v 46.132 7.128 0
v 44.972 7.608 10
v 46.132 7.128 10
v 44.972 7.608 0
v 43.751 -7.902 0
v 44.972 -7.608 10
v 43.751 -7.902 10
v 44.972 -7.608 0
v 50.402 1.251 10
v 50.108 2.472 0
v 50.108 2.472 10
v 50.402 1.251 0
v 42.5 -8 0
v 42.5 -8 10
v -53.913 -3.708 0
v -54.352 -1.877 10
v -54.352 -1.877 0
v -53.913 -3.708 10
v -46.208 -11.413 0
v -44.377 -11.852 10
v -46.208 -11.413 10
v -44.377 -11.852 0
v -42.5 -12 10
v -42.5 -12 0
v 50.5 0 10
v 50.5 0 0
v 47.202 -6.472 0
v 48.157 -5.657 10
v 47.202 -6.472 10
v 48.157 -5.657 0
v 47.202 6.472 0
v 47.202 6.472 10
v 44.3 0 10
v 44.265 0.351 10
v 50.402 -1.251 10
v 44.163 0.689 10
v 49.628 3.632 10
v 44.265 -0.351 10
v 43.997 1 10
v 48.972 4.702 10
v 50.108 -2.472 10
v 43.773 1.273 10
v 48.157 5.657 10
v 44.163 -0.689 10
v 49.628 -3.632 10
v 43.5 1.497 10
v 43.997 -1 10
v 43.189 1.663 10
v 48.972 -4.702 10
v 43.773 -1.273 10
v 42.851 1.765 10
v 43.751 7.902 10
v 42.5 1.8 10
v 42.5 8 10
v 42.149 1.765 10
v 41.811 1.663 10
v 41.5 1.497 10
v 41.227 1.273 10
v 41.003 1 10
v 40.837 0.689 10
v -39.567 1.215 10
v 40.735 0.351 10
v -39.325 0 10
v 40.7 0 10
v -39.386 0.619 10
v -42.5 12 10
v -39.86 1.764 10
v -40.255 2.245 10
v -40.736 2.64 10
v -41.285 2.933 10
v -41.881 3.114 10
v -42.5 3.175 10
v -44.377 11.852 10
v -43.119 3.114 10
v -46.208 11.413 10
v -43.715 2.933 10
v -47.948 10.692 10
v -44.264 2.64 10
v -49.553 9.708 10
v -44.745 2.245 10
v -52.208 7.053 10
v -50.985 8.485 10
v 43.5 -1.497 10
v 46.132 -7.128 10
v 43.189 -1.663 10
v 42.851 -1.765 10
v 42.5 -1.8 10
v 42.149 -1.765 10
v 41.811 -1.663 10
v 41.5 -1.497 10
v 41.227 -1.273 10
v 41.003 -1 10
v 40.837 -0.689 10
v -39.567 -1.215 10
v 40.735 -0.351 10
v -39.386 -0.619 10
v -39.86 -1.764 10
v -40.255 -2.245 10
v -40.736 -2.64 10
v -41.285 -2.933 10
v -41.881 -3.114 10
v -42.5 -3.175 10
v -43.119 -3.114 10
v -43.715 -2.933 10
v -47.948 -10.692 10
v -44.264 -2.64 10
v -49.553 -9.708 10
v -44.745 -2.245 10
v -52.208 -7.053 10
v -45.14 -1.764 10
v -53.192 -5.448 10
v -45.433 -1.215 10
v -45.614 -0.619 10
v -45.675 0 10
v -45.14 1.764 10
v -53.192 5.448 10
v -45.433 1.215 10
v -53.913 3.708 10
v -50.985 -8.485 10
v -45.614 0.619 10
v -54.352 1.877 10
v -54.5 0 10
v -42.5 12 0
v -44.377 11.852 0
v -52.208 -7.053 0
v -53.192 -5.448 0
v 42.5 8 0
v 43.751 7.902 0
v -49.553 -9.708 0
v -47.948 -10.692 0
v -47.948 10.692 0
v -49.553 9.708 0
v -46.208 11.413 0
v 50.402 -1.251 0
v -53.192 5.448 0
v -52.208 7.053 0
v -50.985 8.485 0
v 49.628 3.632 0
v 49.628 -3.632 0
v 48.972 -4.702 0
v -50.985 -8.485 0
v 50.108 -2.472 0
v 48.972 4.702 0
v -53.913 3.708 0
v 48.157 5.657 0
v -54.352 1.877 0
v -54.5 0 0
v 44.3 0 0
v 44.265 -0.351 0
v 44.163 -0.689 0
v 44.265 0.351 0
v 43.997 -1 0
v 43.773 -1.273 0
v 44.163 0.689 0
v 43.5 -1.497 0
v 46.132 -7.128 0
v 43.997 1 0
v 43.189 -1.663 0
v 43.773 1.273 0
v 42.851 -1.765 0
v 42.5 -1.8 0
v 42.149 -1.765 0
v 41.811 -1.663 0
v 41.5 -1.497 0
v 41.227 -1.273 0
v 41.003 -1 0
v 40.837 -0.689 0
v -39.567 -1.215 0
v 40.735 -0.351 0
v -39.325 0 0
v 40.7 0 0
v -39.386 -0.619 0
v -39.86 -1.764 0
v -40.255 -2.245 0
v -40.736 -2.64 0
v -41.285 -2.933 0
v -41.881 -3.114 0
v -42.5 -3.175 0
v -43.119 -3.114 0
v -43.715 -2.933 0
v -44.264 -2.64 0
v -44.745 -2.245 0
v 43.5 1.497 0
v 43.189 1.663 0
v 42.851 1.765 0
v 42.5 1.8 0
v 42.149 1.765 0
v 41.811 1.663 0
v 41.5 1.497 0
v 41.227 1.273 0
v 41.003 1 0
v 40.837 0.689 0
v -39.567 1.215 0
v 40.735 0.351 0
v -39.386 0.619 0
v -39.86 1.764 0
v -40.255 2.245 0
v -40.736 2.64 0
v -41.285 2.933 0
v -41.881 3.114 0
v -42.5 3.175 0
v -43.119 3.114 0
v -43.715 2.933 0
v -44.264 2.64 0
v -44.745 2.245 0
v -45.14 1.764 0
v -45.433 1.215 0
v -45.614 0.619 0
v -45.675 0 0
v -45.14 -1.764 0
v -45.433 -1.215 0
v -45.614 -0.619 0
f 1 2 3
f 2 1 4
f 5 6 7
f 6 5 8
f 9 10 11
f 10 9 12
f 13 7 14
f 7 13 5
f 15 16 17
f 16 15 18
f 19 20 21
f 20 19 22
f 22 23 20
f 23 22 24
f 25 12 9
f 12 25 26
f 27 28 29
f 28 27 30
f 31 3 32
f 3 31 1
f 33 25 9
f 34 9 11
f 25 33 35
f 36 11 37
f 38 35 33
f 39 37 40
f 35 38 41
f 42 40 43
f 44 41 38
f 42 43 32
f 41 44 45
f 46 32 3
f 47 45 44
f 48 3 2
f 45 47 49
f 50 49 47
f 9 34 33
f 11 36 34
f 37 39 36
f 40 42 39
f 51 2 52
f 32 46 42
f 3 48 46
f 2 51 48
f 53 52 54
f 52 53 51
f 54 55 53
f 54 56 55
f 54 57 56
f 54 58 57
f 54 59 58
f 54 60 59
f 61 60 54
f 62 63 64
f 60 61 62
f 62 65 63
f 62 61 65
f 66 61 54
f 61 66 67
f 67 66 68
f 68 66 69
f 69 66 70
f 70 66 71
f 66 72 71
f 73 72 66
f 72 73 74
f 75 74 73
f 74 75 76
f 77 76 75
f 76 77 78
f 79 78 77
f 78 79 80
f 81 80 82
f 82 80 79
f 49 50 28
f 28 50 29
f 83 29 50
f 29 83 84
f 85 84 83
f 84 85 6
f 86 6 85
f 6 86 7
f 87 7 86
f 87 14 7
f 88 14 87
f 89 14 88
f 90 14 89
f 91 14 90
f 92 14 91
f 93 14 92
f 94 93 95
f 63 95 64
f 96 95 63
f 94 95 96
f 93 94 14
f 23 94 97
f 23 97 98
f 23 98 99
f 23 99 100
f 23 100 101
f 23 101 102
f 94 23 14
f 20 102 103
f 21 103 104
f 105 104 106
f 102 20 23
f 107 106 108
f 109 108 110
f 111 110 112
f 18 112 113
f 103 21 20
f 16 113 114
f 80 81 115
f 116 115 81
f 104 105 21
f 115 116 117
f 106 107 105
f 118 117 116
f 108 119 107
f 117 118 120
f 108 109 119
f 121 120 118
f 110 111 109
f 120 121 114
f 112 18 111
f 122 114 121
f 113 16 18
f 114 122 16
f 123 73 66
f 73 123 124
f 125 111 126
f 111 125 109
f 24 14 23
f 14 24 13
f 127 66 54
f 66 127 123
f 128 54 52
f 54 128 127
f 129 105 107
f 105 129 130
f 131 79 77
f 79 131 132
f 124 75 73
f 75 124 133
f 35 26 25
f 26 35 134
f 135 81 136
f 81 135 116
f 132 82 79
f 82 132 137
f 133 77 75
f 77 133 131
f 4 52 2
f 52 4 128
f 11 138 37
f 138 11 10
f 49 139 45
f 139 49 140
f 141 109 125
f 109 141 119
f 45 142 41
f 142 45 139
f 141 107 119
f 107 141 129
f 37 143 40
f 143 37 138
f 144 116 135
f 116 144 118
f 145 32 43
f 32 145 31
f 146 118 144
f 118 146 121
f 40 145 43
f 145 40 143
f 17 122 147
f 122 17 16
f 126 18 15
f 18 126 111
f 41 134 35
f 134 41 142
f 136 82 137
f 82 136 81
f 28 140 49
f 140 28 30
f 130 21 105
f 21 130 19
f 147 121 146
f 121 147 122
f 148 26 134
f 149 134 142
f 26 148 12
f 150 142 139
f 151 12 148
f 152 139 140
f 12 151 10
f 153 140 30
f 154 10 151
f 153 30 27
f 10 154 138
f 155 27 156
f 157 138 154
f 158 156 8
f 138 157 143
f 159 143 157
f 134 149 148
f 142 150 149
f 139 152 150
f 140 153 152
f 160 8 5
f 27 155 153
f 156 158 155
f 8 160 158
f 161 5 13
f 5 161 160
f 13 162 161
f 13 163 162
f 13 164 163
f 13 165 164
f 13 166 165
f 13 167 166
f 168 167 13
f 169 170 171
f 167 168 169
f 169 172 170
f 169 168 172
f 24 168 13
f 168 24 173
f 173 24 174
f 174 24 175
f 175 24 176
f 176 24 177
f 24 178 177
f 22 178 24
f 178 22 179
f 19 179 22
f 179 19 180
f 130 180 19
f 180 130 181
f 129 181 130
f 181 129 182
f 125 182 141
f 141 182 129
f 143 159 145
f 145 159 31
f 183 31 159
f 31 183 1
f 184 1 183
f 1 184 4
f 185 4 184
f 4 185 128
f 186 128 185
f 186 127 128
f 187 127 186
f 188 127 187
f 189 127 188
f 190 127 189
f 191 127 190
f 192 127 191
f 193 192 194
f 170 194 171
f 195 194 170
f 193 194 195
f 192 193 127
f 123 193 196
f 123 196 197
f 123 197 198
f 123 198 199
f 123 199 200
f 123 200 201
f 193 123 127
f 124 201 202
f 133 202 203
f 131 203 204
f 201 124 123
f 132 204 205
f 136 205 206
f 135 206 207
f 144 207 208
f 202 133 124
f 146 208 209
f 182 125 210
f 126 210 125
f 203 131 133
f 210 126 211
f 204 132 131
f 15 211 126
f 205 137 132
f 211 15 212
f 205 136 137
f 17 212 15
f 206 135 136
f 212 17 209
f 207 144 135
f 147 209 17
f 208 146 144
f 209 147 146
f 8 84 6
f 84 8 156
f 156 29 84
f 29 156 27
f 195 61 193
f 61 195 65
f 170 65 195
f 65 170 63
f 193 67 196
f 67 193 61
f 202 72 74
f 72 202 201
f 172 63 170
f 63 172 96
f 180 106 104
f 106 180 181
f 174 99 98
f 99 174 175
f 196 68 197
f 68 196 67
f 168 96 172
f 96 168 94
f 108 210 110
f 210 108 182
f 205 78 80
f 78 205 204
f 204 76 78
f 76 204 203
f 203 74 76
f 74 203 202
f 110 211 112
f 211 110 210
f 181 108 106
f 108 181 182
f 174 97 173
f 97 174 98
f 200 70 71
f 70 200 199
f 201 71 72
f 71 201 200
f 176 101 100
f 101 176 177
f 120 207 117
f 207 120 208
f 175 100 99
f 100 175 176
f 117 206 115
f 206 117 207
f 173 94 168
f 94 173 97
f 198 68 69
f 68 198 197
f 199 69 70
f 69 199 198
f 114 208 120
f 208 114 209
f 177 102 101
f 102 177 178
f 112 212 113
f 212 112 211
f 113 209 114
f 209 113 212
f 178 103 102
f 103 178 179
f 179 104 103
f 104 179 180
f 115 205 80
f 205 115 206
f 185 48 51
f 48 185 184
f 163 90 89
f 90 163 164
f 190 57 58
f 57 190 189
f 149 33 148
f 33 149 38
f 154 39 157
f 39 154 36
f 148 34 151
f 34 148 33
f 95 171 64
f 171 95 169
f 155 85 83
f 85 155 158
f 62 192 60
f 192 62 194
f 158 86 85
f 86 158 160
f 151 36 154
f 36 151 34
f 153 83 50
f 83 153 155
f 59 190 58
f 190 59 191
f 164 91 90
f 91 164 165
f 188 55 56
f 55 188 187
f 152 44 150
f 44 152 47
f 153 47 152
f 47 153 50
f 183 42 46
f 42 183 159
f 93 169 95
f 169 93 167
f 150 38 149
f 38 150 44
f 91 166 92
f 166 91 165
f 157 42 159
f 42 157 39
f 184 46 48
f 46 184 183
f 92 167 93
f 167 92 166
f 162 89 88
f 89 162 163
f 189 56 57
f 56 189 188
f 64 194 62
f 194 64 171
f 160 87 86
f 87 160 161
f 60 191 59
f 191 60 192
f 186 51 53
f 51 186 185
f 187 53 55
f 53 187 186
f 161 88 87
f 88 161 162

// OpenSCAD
$fn = 32;
// ----------------------------------------------------------------------
// Lever: 85 mm between the bosses, 10 mm thick, smooth outline
// ----------------------------------------------------------------------

// --- parameters (mm) ---
lever_l = 85;             // distance between the boss centres
boss_a = 24;              // first boss diameter
boss_b = 16;              // second boss diameter
bore_a = 6.35;            // first bore
bore_b = 3.6;             // second bore
lever_t = 10;             // lever thickness

lever_profile = [[-54.5, 0], [-54.352, -1.877], [-53.913, -3.708], [-53.192, -5.448], [-52.208, -7.053], [-50.985, -8.485], [-49.553, -9.708], [-47.948, -10.692], [-46.208, -11.413], [-44.377, -11.852], [-42.5, -12], [42.5, -8], [43.751, -7.902], [44.972, -7.608], [46.132, -7.128], [47.202, -6.472], [48.157, -5.657], [48.972, -4.702], [49.628, -3.632], [50.108, -2.472], [50.402, -1.251], [50.5, 0], [50.402, 1.251], [50.108, 2.472], [49.628, 3.632], [48.972, 4.702], [48.157, 5.657], [47.202, 6.472], [46.132, 7.128], [44.972, 7.608], [43.751, 7.902], [42.5, 8], [-42.5, 12], [-44.377, 11.852], [-46.208, 11.413], [-47.948, 10.692], [-49.553, 9.708], [-50.985, 8.485], [-52.208, 7.053], [-53.192, 5.448], [-53.913, 3.708], [-54.352, 1.877]];

difference() {
  linear_extrude(height = lever_t) polygon(lever_profile);
  translate([-42.5, 0, -2.5]) cylinder(h = lever_t + 5, d = bore_a);
  translate([42.5, 0, -2.5]) cylinder(h = lever_t + 5, d = bore_b);
}
